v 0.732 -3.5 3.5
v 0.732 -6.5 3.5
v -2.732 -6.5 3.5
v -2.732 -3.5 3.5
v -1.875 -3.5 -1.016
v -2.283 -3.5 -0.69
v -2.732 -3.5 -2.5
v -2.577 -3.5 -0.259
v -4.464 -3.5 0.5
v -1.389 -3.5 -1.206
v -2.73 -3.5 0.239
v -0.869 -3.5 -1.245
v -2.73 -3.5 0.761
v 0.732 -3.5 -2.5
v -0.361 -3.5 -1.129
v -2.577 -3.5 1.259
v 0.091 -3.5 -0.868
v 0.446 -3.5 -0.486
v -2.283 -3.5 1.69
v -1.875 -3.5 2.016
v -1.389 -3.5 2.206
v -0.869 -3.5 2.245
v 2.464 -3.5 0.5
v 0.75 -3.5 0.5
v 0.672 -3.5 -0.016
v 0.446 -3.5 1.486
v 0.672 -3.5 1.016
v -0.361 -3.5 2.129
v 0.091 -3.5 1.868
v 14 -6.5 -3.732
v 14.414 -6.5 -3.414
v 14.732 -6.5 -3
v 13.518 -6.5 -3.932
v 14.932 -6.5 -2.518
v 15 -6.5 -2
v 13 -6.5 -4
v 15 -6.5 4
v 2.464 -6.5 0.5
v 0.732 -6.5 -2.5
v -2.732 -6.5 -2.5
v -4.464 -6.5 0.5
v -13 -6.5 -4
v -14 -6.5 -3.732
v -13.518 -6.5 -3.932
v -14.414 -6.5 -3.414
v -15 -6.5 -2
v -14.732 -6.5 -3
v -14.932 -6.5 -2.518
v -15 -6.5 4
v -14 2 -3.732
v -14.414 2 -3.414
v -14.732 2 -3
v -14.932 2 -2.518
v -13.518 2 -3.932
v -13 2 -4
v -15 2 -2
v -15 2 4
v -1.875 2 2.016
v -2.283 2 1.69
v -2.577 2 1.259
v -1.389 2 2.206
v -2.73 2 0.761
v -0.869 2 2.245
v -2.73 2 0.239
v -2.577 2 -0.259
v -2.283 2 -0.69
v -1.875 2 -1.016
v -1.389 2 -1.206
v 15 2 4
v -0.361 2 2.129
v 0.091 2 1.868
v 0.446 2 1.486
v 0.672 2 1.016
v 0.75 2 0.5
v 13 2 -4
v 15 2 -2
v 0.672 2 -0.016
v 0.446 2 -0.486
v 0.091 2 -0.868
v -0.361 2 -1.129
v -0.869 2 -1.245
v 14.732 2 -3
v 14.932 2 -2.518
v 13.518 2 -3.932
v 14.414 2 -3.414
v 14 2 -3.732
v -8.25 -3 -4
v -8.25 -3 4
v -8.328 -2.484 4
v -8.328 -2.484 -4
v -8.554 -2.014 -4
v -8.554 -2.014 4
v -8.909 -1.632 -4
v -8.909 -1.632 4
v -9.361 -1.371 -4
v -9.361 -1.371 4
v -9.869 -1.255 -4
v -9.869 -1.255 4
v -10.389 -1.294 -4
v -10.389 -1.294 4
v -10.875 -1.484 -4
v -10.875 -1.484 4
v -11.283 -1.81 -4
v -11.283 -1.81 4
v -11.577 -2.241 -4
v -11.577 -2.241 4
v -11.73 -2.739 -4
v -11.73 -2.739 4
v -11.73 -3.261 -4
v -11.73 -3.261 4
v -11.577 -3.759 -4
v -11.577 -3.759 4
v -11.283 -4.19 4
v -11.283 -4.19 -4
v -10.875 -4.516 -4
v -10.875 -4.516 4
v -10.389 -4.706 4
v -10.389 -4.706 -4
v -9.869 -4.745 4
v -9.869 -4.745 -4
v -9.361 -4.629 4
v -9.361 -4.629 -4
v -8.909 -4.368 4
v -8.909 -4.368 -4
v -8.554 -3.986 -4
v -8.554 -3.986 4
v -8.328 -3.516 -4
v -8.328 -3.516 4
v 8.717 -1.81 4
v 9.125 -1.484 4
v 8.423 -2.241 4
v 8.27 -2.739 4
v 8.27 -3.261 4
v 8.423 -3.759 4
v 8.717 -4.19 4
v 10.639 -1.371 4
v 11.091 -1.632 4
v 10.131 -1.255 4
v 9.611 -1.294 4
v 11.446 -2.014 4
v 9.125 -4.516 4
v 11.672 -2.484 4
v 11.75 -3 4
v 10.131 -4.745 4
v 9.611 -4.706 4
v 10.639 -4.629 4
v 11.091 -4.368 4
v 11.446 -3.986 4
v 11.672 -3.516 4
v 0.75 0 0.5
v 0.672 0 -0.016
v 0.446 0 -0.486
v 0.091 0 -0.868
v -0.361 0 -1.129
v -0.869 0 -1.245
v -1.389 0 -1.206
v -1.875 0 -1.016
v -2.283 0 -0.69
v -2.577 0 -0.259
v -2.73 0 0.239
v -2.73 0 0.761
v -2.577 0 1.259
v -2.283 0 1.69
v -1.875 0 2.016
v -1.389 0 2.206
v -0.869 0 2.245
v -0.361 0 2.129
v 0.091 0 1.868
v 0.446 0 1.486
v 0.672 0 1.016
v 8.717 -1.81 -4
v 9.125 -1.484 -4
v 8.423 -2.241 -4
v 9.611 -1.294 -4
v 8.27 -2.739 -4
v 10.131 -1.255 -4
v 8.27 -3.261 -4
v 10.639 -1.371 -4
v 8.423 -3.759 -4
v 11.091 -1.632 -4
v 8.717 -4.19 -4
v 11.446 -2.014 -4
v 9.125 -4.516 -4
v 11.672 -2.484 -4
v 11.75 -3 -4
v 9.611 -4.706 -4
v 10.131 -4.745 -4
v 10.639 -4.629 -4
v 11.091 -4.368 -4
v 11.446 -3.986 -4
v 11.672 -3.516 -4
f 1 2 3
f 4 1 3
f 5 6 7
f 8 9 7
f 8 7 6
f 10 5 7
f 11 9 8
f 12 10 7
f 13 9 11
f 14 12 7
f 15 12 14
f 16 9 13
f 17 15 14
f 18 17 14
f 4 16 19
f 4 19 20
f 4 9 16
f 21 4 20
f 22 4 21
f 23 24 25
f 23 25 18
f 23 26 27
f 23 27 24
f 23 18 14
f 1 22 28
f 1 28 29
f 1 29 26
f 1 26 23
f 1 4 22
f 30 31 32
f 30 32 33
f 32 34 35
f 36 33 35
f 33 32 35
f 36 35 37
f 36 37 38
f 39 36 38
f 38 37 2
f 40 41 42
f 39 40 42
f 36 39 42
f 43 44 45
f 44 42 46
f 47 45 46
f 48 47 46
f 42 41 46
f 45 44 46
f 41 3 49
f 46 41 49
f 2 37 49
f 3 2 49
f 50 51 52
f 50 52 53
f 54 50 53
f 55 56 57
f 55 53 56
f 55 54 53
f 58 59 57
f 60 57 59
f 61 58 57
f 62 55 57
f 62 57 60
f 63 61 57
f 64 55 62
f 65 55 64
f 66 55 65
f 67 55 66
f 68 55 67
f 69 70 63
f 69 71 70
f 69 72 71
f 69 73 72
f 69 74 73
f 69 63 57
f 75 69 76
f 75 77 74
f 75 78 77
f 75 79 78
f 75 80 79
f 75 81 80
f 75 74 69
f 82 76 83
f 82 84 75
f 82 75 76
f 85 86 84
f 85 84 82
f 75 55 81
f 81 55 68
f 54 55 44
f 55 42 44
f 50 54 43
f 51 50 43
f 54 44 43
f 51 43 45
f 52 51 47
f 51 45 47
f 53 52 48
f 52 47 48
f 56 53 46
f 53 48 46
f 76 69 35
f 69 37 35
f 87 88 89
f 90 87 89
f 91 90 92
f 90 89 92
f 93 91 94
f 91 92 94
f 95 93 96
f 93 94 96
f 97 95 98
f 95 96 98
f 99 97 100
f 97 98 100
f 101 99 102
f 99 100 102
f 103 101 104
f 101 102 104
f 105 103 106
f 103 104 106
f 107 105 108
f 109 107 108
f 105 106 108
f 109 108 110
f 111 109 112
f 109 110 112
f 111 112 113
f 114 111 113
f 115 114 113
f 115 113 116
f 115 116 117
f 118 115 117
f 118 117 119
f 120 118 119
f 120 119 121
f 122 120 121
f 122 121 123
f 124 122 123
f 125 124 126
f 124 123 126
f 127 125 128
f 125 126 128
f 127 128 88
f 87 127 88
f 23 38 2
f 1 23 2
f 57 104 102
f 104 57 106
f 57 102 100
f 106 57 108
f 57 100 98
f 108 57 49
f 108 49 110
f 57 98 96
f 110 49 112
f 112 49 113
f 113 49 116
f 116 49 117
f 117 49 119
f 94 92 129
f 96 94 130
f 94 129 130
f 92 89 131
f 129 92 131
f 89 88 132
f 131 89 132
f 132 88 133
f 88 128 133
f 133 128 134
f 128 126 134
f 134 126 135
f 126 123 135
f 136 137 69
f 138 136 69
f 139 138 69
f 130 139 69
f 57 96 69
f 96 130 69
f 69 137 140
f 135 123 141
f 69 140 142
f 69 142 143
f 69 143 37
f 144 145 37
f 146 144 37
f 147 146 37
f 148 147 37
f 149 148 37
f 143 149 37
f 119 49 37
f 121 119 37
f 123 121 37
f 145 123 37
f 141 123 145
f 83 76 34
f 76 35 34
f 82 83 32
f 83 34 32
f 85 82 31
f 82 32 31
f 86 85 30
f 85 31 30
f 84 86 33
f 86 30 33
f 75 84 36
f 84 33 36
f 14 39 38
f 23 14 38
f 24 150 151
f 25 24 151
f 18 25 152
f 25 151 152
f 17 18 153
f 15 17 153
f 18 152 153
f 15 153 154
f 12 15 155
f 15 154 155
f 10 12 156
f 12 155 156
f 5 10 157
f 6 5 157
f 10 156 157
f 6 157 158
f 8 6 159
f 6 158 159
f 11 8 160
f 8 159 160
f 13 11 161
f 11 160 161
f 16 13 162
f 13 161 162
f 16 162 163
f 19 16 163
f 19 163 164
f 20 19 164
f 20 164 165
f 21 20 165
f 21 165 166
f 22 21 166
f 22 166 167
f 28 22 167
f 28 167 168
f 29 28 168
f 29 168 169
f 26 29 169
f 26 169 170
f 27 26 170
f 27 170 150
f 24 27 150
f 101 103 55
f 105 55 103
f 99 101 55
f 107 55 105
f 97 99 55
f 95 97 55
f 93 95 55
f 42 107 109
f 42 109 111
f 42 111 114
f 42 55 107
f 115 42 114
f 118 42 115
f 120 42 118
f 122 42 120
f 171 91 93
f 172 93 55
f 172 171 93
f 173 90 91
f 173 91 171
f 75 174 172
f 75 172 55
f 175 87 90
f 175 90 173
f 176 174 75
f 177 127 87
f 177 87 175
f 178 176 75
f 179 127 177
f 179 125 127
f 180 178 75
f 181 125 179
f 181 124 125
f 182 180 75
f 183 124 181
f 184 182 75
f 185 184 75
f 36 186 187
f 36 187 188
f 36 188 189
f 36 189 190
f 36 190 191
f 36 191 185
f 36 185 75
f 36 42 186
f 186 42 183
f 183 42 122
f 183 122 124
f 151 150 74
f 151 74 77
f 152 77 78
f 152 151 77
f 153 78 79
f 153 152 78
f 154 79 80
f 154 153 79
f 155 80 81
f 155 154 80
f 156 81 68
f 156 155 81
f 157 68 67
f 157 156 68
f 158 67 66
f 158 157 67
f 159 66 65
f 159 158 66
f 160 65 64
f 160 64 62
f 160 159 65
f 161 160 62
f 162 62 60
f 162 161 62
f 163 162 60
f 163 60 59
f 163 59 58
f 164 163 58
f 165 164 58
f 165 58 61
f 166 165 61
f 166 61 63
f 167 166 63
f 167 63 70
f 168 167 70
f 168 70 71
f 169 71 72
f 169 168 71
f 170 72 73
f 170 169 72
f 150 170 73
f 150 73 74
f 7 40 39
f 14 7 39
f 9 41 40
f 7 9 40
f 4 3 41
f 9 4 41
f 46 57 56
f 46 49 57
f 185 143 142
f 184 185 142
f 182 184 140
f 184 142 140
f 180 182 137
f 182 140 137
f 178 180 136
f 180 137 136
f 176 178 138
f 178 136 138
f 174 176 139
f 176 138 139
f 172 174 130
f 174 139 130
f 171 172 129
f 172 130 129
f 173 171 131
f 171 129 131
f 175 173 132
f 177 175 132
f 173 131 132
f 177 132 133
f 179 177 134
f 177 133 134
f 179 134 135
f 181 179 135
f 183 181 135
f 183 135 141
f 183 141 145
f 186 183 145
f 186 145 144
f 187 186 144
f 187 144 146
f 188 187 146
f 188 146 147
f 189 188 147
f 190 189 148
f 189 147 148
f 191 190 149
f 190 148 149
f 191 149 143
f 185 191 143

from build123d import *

# Parameters (mm, degrees)
SKETCH1_W           = 30
SKETCH1_H           = 8
SKETCH1_R           = 1.75
BOSS_EXTRUDE1_DEPTH = 2
SKETCH2_R           = 1.75
BOSS_EXTRUDE2_DEPTH = 8
FILLET1_R           = 2
SKETCH3_R           = 1.75
CUT_EXTRUDE1_DEPTH  = 7.5
CUT_EXTRUDE2_DEPTH  = 3


with BuildPart() as part:
    # Sketch1 → Boss-Extrude1 (new body)
    with BuildSketch(Plane(origin=(0, 0, 0), x_dir=(1, 0, 0), z_dir=(0, 1, 0))):
        Rectangle(SKETCH1_W, SKETCH1_H)
        with Locations((-1, -0.5)):
            Circle(SKETCH1_R, mode=Mode.SUBTRACT)
    extrude(amount=BOSS_EXTRUDE1_DEPTH)

    # Sketch2 → Boss-Extrude2 (add)
    with BuildSketch(Plane.XY.offset(4)):
        Polygon((-15, 0), (-5, 0), (5, 0), (15, 0), (15, -6.5), (-15, -6.5), align=None)
        with Locations((-10, -3)):
            Circle(SKETCH2_R, mode=Mode.SUBTRACT)
        with Locations((10, -3)):
            Circle(SKETCH2_R, mode=Mode.SUBTRACT)
    extrude(amount=-BOSS_EXTRUDE2_DEPTH)

    # Fillet1
    fillet1_edges = [part.edges().sort_by_distance(p)[0] for p in [
        (-15, -2.25, -4),
        (15, -2.25, -4),
    ]]
    fillet(fillet1_edges, radius=FILLET1_R)

    # Sketch3 → Cut-Extrude1 (cut, through all)
    with BuildSketch(Plane(origin=(0, 0, 0), x_dir=(1, 0, 0), z_dir=(0, 1, 0))):
        with Locations((-1, -0.5)):
            Circle(SKETCH3_R)
    extrude(amount=-CUT_EXTRUDE1_DEPTH, mode=Mode.SUBTRACT)

    # Sketch4 → Cut-Extrude2 (cut)
    with BuildSketch(Plane.XZ.offset(6.5)):
        Polygon((2.464101615, 0.5), (0.732050808, 3.5), (-2.732050808, 3.5), (-4.464101615, 0.5), (-2.732050808, -2.5), (0.732050808, -2.5), align=None)
    extrude(amount=-CUT_EXTRUDE2_DEPTH, mode=Mode.SUBTRACT)


solid = part.part
